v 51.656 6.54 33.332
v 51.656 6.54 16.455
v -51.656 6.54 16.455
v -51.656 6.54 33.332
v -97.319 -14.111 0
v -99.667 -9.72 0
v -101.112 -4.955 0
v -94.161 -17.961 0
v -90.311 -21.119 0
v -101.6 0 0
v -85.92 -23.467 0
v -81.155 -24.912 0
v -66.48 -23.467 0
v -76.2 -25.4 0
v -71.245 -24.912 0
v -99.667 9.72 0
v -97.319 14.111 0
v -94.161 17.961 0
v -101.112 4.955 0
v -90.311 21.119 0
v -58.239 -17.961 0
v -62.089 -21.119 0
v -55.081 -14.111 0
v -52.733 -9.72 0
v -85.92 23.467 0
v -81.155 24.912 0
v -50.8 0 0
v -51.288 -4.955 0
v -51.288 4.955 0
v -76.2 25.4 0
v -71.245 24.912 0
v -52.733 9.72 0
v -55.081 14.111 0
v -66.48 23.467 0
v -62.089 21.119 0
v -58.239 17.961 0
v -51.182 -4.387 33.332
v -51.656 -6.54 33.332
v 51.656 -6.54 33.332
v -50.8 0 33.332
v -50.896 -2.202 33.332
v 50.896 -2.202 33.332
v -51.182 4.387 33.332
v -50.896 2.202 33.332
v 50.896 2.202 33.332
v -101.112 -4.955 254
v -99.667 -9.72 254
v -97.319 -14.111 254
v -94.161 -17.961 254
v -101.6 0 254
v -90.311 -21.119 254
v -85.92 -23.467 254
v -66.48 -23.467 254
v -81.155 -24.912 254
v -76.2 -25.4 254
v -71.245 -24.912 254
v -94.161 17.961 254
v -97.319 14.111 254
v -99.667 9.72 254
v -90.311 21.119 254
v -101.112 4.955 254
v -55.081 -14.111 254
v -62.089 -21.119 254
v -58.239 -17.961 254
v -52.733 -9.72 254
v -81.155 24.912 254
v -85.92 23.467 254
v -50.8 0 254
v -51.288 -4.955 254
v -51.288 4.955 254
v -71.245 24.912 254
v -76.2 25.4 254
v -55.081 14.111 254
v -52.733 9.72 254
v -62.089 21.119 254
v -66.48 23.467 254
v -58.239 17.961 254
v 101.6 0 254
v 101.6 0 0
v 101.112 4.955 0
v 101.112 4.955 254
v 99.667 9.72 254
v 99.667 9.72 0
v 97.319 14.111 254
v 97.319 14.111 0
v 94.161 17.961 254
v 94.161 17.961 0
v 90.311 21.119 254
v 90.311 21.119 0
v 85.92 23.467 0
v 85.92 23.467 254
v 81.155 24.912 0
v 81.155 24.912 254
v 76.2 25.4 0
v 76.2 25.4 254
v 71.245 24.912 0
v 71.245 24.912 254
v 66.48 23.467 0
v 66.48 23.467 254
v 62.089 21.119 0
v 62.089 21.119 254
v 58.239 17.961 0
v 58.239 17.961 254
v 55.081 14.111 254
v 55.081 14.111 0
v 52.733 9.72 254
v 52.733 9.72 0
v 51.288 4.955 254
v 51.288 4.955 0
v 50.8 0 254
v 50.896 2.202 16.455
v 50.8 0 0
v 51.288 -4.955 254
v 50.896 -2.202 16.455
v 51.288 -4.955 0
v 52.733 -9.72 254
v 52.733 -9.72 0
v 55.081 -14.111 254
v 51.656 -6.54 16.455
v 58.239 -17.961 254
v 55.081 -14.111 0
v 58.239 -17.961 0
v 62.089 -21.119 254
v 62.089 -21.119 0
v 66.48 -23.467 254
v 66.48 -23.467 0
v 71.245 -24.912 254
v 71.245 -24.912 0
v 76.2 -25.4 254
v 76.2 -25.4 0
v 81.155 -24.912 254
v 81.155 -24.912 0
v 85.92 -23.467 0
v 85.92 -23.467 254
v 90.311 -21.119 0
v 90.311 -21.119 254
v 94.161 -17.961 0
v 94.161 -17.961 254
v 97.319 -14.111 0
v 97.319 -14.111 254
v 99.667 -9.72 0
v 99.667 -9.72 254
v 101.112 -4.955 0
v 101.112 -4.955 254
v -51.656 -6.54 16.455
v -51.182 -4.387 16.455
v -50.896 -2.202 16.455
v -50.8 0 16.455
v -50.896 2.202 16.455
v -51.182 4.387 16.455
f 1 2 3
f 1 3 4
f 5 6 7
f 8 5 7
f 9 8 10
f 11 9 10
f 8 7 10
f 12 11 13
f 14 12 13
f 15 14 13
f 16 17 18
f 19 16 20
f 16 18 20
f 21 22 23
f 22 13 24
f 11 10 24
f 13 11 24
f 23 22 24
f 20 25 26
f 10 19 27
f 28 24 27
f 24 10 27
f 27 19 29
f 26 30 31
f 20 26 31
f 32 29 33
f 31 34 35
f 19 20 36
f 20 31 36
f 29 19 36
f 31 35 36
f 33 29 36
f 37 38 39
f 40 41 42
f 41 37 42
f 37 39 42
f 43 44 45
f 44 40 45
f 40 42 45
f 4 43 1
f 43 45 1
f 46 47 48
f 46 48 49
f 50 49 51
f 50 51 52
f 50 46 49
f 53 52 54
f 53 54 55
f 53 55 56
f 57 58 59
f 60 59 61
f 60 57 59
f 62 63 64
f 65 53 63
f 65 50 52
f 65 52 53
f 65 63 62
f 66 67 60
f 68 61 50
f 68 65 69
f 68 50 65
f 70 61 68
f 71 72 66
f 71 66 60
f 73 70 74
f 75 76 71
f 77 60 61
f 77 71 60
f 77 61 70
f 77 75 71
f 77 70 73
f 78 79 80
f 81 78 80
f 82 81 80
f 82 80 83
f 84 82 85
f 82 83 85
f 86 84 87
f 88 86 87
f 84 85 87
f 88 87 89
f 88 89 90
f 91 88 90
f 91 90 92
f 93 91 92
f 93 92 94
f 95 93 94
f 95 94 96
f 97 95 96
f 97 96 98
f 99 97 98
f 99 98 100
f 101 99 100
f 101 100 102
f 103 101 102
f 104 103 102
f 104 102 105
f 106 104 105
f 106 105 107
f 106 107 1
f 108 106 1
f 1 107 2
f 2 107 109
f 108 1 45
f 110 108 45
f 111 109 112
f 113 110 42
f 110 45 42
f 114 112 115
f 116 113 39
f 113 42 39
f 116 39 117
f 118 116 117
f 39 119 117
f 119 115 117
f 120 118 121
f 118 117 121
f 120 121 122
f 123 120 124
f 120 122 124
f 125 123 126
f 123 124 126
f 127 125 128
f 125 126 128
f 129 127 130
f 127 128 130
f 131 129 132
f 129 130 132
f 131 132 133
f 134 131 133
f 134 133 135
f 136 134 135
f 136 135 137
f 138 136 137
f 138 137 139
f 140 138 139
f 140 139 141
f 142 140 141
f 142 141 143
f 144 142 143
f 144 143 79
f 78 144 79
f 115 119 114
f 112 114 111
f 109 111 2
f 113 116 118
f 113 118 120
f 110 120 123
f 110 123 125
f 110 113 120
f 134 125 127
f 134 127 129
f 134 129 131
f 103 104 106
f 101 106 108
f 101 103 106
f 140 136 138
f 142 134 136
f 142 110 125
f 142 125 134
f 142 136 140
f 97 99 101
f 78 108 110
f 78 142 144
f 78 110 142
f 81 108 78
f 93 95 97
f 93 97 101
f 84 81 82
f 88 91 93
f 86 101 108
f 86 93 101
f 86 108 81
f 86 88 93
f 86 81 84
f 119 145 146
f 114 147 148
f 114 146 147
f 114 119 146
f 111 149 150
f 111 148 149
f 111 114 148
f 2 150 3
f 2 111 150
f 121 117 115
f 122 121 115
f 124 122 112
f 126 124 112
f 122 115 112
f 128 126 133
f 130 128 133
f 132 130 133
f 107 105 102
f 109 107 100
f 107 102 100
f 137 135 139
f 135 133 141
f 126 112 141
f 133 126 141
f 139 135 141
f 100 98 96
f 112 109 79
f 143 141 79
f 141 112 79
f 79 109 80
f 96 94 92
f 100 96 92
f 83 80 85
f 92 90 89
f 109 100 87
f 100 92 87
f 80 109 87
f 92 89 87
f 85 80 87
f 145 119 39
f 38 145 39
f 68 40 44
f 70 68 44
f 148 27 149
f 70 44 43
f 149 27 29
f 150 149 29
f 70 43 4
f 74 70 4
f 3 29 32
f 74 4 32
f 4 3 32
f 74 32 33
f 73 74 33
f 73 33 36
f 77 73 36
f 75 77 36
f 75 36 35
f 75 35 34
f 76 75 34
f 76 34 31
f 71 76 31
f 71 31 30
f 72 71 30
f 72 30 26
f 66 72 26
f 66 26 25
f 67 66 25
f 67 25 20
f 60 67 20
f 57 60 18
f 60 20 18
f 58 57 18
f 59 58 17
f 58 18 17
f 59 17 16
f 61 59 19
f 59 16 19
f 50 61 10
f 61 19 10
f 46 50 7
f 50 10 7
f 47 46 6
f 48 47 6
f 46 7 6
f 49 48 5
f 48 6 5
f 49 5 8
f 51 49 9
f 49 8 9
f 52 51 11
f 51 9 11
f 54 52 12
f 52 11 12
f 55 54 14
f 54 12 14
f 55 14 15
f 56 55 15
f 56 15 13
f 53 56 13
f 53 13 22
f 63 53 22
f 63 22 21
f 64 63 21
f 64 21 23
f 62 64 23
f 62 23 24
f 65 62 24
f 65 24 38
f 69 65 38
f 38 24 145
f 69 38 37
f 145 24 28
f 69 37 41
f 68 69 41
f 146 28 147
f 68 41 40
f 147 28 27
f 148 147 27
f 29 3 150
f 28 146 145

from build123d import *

# Parameters (mm, degrees)
F1_W     = 13.079472
F1_H     = 16.876735
F2_DEPTH = 76.2
F0_R     = 25.4
F3_DEPTH = 254


with BuildPart() as f2:
    # F1 (on Right) → F2 (new body, symmetric)
    with BuildSketch(Plane.YZ):
        with Locations((6e-06, 24.893183)):
            Rectangle(F1_W, F1_H)
    extrude(amount=F2_DEPTH, both=True)

    # F0 (on Top) → F3 (join)
    with BuildSketch(Plane.XY):
        with Locations((-76.2, 0)):
            Circle(F0_R)
        with Locations((76.2, 0)):
            Circle(F0_R)
    extrude(amount=F3_DEPTH)


solid = f2.part
